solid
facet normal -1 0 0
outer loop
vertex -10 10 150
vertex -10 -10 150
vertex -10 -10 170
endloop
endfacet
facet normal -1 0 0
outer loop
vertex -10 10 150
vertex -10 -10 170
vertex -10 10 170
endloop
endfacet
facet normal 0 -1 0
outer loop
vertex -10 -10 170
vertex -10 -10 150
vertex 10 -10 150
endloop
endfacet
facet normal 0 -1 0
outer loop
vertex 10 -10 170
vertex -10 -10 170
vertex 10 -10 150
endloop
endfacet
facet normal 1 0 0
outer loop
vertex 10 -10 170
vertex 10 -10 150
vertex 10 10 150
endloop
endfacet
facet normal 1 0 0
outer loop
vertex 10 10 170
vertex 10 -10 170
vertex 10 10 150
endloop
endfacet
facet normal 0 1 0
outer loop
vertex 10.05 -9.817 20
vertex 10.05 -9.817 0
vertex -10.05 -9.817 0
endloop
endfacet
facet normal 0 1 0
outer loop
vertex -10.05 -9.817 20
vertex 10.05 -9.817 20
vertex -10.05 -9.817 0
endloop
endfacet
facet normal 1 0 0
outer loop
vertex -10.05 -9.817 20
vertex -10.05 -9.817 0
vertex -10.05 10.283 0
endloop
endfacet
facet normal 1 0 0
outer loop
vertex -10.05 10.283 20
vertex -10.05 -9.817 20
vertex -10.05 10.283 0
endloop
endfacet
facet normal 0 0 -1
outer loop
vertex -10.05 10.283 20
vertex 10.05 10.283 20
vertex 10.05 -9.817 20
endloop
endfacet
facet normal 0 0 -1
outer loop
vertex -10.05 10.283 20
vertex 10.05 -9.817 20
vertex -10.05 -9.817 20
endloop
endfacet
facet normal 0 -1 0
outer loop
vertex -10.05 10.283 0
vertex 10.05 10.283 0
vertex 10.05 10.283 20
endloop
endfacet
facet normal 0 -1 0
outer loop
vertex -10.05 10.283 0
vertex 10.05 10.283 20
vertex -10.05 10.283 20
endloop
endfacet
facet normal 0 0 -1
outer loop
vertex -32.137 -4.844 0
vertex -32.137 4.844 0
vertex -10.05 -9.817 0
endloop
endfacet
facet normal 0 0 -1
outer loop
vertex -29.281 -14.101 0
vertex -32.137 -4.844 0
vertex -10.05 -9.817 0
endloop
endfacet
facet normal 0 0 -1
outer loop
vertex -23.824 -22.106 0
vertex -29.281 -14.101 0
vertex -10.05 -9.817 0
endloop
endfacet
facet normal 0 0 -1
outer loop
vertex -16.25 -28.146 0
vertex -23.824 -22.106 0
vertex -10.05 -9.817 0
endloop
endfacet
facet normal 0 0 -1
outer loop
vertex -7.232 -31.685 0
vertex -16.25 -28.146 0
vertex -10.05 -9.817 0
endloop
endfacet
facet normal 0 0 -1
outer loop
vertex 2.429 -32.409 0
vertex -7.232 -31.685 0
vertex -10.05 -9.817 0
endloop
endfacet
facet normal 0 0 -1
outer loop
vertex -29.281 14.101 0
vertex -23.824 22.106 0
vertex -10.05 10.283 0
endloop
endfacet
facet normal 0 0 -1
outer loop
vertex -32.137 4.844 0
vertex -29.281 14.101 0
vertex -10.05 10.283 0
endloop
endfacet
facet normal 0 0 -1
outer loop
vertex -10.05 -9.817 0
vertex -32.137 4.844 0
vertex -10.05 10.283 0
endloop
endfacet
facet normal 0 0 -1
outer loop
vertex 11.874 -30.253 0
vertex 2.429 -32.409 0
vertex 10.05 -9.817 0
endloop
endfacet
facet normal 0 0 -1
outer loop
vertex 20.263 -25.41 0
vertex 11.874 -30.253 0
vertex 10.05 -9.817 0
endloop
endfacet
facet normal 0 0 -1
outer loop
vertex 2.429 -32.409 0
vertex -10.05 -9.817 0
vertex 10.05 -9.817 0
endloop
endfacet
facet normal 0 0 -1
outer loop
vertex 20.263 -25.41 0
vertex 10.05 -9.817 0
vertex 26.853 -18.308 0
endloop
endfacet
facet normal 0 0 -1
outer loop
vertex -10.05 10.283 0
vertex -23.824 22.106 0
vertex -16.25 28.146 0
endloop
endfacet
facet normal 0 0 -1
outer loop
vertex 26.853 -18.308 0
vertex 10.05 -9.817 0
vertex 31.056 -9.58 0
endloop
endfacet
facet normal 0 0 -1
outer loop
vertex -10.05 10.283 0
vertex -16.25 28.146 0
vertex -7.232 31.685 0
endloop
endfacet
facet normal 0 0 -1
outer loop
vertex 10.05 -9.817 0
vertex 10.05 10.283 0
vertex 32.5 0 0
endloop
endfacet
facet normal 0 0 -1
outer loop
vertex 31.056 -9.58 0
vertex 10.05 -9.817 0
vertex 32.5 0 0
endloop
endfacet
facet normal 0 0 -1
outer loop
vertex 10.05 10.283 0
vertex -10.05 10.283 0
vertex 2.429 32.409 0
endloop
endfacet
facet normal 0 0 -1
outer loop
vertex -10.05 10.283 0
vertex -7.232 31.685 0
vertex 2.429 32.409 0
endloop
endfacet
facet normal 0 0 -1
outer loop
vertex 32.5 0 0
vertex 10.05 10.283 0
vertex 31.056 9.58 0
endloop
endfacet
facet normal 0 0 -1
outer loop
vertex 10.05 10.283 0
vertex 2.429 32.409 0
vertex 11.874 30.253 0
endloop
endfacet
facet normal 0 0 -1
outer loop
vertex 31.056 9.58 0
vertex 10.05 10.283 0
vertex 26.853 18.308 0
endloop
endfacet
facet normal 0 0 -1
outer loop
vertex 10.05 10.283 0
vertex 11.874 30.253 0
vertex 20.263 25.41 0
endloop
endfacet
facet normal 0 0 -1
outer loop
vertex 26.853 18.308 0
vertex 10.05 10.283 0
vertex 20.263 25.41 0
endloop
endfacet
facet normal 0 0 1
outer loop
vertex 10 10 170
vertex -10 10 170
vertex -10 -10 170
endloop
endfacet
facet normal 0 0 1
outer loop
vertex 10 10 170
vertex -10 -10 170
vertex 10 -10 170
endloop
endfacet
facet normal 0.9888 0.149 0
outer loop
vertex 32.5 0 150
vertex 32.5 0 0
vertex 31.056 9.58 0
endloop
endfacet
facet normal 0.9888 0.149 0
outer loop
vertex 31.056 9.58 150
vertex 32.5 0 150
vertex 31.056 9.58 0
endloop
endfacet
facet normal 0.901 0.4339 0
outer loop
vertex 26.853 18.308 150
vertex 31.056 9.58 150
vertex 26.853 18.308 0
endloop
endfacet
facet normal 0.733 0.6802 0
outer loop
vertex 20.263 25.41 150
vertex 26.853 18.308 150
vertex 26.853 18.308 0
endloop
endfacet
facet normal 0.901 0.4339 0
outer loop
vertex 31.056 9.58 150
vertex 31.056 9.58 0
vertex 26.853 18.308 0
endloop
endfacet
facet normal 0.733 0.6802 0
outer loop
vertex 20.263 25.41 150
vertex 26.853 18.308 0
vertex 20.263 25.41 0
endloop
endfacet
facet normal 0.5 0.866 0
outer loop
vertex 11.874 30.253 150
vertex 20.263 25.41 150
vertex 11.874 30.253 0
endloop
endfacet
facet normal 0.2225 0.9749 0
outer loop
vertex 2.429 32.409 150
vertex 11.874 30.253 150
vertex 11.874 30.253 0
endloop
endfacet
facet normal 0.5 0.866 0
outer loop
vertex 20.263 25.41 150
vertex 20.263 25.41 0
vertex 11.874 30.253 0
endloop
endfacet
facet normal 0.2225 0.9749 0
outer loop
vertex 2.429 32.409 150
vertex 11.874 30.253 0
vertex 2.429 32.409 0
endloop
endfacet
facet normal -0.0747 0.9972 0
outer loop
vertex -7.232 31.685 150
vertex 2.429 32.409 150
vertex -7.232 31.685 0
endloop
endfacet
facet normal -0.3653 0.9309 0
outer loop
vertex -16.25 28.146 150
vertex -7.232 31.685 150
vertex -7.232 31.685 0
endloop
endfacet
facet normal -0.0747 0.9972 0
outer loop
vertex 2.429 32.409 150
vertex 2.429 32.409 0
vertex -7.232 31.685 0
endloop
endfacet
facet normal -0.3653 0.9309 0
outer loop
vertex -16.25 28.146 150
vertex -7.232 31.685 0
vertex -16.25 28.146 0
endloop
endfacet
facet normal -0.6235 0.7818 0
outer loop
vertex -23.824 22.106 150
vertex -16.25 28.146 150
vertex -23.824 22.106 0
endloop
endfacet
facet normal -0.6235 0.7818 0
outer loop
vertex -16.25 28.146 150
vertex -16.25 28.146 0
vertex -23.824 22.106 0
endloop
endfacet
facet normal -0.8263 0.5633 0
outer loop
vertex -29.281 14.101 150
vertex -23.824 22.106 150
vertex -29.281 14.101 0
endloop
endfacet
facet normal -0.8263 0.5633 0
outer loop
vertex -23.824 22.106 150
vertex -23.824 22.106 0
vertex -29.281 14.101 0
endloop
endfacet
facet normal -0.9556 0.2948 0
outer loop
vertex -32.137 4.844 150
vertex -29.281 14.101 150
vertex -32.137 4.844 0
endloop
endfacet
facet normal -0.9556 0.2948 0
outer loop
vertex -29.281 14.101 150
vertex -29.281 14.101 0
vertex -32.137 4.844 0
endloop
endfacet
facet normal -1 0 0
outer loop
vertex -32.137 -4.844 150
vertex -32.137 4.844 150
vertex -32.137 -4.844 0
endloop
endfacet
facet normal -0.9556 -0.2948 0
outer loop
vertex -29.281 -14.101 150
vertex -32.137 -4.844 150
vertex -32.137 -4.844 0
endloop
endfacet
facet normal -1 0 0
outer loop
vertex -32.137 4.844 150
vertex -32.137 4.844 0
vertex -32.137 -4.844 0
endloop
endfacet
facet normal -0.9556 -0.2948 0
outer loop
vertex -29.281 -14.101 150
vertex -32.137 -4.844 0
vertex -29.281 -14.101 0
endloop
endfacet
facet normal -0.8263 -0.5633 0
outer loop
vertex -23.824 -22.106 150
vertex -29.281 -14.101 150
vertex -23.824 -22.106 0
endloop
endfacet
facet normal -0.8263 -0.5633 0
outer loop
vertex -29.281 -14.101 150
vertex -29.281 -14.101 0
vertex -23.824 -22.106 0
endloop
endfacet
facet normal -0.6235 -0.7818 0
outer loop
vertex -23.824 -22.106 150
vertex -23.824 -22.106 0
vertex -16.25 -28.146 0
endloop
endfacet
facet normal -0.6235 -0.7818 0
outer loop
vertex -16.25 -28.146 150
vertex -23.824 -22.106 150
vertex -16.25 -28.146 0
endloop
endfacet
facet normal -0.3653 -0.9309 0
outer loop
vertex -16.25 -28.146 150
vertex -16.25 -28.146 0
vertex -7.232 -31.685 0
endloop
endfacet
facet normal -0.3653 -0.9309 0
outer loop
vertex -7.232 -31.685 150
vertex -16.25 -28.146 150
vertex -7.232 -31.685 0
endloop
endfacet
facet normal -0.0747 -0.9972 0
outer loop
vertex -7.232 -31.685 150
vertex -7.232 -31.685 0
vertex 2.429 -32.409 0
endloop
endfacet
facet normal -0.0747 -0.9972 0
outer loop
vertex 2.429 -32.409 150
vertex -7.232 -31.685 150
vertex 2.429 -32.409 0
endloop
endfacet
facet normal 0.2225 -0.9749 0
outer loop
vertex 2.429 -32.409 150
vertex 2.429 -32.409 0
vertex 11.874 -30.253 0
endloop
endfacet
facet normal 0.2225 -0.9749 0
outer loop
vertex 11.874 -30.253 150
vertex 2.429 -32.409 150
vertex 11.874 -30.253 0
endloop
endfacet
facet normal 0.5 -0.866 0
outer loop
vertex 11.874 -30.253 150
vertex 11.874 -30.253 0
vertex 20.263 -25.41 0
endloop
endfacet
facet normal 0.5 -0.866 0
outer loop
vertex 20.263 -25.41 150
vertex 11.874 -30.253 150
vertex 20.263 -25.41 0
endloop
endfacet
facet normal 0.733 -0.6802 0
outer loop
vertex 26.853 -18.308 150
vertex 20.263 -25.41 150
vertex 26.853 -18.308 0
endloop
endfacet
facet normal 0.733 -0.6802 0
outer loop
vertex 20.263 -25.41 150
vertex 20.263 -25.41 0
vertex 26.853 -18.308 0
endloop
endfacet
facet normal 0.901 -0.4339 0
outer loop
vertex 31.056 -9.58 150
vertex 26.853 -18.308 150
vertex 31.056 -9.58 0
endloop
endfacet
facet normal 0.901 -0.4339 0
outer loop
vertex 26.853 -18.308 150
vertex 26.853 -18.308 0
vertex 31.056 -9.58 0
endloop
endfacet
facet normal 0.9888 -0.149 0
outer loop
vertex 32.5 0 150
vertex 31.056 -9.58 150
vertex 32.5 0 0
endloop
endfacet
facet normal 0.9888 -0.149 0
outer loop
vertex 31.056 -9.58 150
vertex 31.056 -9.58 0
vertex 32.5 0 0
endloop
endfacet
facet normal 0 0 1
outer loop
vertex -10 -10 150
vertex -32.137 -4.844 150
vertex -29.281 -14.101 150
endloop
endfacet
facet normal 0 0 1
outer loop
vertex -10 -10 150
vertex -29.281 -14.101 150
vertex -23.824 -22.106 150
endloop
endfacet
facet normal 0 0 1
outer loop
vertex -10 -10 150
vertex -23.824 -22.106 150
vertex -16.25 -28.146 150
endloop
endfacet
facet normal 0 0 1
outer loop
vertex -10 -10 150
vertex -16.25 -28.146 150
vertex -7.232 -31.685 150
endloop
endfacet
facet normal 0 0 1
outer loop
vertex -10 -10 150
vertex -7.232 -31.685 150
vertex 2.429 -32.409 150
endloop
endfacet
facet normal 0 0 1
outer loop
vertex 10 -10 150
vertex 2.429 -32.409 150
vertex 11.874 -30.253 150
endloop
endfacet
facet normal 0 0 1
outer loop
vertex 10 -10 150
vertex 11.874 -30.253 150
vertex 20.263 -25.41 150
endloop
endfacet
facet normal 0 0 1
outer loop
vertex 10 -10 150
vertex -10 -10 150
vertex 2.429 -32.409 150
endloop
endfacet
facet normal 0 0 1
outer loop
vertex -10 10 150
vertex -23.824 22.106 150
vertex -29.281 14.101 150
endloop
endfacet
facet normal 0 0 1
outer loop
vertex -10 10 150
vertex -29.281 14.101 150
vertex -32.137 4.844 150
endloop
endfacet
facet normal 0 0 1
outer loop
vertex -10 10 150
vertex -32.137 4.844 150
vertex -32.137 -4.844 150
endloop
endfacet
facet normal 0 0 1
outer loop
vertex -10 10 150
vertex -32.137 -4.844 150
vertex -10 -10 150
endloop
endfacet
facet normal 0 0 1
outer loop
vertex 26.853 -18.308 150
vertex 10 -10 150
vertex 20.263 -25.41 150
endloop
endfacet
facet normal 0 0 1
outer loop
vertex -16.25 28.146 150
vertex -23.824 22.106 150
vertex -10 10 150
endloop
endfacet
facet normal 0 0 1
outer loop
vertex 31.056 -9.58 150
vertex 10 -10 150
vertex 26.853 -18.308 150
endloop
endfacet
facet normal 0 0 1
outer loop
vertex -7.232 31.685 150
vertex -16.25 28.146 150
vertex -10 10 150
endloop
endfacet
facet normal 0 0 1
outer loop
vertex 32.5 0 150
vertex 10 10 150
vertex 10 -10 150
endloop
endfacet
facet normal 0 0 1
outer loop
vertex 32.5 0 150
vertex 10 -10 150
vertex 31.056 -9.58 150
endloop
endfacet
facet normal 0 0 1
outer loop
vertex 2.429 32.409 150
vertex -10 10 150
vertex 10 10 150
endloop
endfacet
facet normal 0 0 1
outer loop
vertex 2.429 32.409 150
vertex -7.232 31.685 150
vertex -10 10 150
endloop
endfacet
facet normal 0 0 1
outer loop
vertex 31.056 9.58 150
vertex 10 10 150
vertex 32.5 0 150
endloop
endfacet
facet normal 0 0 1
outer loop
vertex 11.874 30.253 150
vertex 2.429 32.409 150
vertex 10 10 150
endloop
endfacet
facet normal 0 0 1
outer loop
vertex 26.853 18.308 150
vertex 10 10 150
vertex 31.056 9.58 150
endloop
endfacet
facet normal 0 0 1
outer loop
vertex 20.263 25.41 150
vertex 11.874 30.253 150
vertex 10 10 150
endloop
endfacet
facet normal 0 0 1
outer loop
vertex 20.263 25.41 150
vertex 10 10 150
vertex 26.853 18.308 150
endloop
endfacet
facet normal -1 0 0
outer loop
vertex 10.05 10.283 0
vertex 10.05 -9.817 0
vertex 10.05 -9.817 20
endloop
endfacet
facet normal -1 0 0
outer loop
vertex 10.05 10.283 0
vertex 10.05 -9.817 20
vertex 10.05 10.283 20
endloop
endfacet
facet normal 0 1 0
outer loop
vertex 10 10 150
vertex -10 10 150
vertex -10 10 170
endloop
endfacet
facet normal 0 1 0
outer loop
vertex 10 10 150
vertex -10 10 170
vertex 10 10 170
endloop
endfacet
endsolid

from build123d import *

# Parameters (mm, degrees)
IZIM2_R                     = 32.5
Y_KSEKLIK_EKSTR_ZYON1_DEPTH = 150
IZIM3_W                     = 20
IZIM3_H                     = 20
Y_KSEKLIK_EKSTR_ZYON2_DEPTH = 20
IZIM5_W                     = 20
IZIM5_H                     = 20
KES_EKSTR_ZYON2_DEPTH       = 20
IZIM6_W                     = 20.1
IZIM6_H                     = 20.1
KES_EKSTR_ZYON3_DEPTH       = 20


with BuildPart() as part:
    # Çizim2 → Yükseklik-Ekstrüzyon1 (new body)
    with BuildSketch(Plane.XY):
        Circle(IZIM2_R)
    extrude(amount=Y_KSEKLIK_EKSTR_ZYON1_DEPTH)

    # Çizim3 → Yükseklik-Ekstrüzyon2 (add)
    with BuildSketch(Plane.XY.offset(150)):
        Rectangle(IZIM3_W, IZIM3_H)
    extrude(amount=Y_KSEKLIK_EKSTR_ZYON2_DEPTH)

    # Çizim5 → Kes-Ekstrüzyon2 (cut)
    with BuildSketch(Plane(origin=(0, 0, 0), x_dir=(-1, 0, 0), z_dir=(0, 0, -1))):
        with Locations((0, 0.232689455)):
            Rectangle(IZIM5_W, IZIM5_H)
    extrude(amount=-KES_EKSTR_ZYON2_DEPTH, mode=Mode.SUBTRACT)

    # Çizim6 → Kes-Ekstrüzyon3 (cut)
    with BuildSketch(Plane(origin=(0, 0, 0), x_dir=(-1, 0, 0), z_dir=(0, 0, -1))):
        with Locations((0, 0.232689455)):
            Rectangle(IZIM6_W, IZIM6_H)
    extrude(amount=-KES_EKSTR_ZYON3_DEPTH, mode=Mode.SUBTRACT)


solid = part.part
